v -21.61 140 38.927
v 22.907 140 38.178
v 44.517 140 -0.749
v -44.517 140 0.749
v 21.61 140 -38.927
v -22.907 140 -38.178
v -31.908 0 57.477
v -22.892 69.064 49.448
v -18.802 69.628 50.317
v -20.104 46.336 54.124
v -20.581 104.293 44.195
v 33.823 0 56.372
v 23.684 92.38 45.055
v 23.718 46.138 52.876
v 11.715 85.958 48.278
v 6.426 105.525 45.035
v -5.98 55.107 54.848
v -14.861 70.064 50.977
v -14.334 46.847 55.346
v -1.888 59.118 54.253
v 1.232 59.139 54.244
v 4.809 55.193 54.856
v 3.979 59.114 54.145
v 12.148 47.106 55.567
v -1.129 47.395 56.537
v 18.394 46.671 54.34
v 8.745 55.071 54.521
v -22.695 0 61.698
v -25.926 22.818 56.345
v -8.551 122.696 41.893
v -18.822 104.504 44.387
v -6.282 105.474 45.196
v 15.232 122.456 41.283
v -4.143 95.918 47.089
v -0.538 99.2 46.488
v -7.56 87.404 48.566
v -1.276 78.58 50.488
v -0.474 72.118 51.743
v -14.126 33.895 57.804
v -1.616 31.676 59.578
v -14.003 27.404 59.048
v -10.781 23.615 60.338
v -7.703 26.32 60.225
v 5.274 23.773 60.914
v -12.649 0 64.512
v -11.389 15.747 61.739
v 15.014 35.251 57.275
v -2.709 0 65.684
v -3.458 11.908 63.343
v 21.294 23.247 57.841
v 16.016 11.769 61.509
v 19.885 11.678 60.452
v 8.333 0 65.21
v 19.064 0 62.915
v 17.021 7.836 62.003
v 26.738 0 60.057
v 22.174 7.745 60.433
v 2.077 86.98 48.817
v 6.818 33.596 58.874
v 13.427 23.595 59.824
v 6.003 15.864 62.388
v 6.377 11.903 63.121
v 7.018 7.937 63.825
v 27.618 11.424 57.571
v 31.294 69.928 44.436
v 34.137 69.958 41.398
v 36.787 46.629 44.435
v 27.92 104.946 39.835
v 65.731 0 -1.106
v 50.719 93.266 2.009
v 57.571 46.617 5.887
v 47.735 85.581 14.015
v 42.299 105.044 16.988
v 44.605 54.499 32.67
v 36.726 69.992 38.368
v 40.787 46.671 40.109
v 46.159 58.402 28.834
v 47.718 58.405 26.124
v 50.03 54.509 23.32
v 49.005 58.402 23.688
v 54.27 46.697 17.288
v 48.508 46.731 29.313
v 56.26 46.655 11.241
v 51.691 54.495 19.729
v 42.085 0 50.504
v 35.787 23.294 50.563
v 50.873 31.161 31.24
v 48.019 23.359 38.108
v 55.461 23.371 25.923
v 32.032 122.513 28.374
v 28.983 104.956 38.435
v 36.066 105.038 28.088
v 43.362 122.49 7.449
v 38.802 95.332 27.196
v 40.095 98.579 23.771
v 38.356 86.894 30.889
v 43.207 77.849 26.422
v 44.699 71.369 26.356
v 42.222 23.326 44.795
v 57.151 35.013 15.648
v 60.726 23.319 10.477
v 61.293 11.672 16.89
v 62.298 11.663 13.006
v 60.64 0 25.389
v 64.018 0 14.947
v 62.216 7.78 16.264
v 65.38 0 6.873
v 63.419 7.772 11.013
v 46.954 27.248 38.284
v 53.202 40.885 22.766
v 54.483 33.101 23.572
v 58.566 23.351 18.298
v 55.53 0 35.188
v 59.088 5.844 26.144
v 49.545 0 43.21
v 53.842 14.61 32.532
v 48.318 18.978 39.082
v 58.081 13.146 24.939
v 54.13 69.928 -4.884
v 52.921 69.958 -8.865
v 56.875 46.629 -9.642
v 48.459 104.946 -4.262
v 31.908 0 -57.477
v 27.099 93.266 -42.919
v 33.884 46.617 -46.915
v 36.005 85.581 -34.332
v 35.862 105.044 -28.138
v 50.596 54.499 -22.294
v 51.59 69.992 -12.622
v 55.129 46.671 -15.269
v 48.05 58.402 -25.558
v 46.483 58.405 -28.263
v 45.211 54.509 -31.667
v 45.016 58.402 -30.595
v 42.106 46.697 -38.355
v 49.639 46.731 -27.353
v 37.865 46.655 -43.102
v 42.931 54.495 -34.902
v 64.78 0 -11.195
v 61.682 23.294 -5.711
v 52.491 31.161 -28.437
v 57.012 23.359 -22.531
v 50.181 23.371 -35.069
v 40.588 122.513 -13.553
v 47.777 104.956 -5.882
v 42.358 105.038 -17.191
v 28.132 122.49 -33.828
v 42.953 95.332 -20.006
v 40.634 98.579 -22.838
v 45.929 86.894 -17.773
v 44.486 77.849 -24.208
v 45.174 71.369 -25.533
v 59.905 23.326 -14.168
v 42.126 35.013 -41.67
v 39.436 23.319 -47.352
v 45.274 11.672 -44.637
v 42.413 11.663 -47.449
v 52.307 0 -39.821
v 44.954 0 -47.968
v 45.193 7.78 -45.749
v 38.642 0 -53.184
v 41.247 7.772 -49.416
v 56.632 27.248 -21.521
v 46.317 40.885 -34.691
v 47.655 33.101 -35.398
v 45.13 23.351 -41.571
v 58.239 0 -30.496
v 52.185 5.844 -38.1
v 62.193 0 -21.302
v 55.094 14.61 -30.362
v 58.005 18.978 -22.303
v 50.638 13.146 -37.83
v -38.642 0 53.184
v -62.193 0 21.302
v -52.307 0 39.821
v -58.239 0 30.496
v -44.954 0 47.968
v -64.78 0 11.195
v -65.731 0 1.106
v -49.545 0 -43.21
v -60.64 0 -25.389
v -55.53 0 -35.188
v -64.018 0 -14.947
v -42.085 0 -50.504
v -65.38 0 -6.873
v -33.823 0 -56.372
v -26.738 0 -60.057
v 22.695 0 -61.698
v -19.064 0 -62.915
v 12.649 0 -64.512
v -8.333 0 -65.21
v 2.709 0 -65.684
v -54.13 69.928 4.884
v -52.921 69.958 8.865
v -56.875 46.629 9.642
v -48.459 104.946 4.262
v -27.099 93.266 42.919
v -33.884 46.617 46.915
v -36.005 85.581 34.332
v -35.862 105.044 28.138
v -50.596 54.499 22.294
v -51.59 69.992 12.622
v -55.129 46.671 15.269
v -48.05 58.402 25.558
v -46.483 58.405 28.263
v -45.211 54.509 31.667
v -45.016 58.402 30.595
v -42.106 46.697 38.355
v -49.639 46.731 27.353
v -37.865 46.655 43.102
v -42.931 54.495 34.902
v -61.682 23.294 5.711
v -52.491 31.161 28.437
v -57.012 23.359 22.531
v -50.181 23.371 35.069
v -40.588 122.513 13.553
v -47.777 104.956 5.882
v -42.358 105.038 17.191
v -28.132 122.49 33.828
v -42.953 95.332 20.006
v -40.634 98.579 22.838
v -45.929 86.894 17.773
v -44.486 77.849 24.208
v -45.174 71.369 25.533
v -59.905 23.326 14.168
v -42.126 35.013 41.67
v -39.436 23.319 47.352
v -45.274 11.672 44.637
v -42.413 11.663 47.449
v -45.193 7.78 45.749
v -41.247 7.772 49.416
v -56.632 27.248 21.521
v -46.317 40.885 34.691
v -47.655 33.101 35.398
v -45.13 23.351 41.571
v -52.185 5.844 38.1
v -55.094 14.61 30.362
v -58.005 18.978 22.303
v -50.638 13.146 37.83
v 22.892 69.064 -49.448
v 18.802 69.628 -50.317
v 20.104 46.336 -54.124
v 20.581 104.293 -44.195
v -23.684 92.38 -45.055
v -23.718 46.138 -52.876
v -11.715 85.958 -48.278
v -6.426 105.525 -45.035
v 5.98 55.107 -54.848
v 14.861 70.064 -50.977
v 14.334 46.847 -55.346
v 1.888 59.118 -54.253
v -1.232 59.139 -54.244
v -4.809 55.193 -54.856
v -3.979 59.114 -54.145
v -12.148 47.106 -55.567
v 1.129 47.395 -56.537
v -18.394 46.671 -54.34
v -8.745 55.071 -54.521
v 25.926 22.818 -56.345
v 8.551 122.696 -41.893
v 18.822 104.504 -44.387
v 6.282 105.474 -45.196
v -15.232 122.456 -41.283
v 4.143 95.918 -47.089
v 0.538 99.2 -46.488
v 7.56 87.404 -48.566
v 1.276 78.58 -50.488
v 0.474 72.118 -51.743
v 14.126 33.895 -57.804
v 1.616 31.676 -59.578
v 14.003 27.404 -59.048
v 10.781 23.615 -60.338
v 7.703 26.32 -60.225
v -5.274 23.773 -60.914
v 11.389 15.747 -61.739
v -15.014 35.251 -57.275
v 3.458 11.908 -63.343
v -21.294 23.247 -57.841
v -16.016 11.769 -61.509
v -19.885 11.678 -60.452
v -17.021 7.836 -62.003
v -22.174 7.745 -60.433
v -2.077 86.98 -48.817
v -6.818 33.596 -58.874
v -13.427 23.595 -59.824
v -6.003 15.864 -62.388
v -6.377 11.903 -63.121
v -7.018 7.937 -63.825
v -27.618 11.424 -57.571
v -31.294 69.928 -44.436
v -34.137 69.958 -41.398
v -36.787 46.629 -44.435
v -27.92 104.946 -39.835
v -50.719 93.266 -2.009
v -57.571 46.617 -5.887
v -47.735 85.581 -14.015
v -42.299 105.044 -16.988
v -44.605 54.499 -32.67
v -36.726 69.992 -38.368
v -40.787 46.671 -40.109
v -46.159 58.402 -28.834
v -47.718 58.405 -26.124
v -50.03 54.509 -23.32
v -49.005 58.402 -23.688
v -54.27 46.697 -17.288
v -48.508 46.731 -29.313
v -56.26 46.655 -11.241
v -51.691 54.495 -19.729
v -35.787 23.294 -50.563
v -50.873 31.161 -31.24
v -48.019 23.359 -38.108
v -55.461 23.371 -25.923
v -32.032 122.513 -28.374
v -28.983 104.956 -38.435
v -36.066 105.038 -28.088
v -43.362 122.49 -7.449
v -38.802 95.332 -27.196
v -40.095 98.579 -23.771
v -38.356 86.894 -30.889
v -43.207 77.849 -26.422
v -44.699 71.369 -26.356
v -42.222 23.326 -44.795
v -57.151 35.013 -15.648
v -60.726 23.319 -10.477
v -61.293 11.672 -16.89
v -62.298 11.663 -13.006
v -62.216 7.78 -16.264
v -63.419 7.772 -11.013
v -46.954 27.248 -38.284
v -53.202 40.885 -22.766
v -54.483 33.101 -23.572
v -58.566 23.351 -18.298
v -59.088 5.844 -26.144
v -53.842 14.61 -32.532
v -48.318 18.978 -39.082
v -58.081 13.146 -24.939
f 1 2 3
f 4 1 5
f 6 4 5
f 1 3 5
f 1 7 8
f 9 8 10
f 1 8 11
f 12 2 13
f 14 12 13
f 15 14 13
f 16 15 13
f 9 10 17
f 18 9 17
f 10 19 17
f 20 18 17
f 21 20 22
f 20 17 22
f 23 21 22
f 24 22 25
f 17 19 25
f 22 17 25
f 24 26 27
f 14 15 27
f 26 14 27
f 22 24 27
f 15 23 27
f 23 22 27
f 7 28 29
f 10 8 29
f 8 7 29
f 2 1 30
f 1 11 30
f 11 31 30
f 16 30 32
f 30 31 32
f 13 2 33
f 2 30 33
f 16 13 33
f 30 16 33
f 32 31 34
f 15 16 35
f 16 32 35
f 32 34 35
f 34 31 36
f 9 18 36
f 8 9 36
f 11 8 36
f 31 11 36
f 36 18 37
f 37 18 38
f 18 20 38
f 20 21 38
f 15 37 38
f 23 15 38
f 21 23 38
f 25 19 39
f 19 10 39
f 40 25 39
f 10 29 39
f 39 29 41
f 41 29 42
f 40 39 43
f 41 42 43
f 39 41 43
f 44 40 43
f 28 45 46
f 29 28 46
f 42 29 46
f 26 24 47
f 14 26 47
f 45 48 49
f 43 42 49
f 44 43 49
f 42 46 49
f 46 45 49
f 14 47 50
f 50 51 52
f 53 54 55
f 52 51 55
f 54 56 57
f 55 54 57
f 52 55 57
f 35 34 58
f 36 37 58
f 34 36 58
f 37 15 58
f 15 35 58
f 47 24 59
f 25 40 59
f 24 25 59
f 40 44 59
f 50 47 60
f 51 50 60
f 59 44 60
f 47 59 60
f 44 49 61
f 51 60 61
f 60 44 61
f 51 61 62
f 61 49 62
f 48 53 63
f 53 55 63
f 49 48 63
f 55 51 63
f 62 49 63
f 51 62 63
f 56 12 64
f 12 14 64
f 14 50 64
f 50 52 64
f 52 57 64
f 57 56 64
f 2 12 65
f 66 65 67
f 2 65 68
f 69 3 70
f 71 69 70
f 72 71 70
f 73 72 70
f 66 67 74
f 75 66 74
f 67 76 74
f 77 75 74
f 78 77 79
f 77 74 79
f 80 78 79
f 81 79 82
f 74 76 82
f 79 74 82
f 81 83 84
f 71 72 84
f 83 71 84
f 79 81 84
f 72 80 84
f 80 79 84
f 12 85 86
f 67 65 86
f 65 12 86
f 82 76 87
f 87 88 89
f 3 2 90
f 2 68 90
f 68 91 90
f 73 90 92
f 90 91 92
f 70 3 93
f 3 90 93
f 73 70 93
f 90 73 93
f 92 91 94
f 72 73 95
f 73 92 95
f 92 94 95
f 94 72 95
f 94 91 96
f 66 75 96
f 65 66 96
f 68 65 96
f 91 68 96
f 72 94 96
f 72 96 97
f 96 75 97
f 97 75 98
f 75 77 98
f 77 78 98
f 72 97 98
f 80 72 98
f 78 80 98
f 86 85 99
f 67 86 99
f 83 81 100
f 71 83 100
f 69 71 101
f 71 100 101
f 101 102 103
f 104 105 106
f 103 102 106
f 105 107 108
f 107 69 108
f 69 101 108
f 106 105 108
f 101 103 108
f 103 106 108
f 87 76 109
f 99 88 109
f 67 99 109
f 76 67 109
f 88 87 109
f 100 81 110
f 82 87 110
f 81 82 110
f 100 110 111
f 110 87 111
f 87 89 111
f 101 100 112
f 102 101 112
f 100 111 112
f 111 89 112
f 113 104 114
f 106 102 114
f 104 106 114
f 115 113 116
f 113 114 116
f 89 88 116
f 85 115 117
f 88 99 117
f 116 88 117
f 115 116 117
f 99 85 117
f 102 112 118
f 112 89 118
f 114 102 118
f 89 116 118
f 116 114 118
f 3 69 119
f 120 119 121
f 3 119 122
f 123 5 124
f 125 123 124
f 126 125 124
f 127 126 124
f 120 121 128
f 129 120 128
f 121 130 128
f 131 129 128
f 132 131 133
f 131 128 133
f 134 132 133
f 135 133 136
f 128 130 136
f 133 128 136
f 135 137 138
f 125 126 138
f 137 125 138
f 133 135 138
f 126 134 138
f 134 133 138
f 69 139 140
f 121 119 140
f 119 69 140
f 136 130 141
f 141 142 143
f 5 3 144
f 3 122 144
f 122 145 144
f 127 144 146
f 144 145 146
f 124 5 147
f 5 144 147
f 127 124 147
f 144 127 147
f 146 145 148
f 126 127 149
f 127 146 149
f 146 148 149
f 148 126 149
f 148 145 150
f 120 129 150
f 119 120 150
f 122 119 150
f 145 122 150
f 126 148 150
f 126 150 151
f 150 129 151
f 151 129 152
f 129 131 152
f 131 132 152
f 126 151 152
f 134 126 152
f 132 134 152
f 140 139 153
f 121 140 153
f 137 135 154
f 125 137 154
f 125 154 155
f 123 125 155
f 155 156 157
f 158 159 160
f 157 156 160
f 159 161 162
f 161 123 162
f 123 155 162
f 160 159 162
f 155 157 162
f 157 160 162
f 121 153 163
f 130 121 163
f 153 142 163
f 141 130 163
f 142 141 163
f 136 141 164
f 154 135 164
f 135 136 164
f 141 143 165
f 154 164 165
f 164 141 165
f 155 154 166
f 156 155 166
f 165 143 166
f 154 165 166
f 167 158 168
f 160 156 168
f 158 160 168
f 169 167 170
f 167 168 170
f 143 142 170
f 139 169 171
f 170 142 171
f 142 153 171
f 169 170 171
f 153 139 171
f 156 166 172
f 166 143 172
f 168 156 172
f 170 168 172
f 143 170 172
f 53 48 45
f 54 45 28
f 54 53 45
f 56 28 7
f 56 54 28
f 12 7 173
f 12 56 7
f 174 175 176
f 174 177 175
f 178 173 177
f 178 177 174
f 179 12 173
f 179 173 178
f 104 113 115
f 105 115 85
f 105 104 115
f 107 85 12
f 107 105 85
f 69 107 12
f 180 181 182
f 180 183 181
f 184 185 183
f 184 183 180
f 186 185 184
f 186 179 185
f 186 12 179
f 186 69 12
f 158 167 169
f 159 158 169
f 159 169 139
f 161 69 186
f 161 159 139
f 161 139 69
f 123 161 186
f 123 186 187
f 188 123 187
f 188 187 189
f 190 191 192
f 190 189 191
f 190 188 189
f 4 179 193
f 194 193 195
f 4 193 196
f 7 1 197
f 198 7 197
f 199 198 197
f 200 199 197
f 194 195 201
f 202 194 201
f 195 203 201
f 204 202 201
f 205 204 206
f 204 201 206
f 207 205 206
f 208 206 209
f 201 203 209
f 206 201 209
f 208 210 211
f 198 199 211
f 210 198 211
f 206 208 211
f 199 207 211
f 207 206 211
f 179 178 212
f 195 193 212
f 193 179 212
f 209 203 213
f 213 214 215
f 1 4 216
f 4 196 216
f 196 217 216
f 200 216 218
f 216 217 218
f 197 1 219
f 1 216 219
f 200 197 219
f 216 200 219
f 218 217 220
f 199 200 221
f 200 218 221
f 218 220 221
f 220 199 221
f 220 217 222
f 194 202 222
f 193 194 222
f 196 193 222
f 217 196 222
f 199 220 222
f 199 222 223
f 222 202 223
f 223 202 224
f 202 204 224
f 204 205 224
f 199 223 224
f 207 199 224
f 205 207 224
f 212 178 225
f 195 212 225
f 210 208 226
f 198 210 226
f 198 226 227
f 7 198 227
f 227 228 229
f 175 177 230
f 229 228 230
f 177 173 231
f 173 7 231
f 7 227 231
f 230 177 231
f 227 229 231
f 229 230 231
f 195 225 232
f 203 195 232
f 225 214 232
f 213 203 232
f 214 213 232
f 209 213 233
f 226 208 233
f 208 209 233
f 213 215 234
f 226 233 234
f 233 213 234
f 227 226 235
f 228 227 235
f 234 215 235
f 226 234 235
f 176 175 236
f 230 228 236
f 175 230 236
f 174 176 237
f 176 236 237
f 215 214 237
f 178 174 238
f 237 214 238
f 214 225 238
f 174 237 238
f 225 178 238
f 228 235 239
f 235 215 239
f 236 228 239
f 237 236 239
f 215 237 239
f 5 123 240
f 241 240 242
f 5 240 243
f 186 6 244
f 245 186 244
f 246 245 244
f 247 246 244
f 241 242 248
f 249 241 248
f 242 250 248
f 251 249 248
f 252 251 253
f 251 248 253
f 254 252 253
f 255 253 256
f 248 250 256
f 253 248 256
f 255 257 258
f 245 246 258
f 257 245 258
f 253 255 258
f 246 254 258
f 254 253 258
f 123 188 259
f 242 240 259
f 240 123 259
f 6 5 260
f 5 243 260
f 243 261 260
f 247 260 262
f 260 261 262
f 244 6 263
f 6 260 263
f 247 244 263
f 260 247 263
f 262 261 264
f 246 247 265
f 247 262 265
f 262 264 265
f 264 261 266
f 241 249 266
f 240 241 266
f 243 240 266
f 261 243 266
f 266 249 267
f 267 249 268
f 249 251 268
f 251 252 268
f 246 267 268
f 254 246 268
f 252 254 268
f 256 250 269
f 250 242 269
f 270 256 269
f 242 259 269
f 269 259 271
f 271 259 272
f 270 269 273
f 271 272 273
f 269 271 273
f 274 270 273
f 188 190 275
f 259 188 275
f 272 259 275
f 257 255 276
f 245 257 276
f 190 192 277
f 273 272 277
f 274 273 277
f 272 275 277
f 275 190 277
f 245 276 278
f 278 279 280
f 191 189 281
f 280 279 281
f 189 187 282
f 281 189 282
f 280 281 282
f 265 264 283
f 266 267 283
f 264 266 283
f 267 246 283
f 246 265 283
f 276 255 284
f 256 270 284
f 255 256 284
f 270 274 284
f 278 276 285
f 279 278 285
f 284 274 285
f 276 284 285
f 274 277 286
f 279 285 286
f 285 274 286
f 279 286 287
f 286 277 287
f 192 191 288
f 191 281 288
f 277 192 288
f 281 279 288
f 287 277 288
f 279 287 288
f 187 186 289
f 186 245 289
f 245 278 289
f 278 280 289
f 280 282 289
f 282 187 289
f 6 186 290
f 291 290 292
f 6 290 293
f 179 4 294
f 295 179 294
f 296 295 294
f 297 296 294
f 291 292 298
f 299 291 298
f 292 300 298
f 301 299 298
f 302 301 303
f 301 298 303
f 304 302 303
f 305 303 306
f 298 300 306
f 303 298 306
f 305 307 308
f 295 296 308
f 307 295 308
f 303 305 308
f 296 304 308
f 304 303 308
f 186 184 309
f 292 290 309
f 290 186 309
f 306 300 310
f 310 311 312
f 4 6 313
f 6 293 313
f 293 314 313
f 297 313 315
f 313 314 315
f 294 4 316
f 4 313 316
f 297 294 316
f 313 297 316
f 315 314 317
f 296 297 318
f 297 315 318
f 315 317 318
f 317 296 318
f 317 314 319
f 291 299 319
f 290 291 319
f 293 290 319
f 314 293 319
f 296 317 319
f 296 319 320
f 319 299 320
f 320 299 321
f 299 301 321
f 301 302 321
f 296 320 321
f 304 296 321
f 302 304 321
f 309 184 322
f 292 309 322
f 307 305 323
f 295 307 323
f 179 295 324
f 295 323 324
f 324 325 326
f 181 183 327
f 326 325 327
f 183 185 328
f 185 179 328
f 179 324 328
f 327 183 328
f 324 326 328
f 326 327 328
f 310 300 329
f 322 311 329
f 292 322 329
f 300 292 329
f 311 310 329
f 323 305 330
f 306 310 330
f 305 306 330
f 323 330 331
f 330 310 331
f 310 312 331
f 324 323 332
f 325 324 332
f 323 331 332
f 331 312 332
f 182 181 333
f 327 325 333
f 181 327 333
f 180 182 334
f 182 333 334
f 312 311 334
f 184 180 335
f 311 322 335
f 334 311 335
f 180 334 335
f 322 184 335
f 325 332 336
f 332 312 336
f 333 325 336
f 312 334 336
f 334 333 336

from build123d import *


with BuildPart() as part:
    # Sketch2 → Loft2 section 0
    with BuildSketch(Plane(origin=(0, 140, 0), x_dir=(1, 0, 0), z_dir=(0, 1, 0))):
        Polygon((22.906863075, -38.178105125), (44.516640444, 0.748872781), (21.609777369, 38.926977906), (-22.906863075, 38.178105125), (-44.516640444, -0.748872781), (-21.609777369, -38.926977906), align=None)
    # Sketch1 for Loft2 → Loft2 section 1
    with BuildSketch(Plane(origin=(0, 0, 0), x_dir=(1, 0, 0), z_dir=(0, 1, 0))):
        with BuildLine():
            # circular arc as an exact rational Bezier (weights 1, cos(half-angle), 1)
            Bezier((33.823020911, -56.371701518), (66.369237958, -36.843971291), (65.730836025, 1.105744582), weights=[1, 0.866025404, 1])
            Bezier((65.730836025, 1.105744582), (65.092434092, 39.055460455), (31.907815114, 57.477446101), weights=[1, 0.866025404, 1])
            Bezier((31.907815114, 57.477446101), (-1.276803865, 75.899431746), (-33.823020911, 56.371701518), weights=[1, 0.866025404, 1])
            Bezier((-33.823020911, 56.371701518), (-66.369237958, 36.843971291), (-65.730836025, -1.105744582), weights=[1, 0.866025404, 1])
            Bezier((-65.730836025, -1.105744582), (-65.092434092, -39.055460455), (-31.907815114, -57.477446101), weights=[1, 0.866025404, 1])
            Bezier((-31.907815114, -57.477446101), (1.276803865, -75.899431746), (33.823020911, -56.371701518), weights=[1, 0.866025404, 1])
        make_face()
    loft()


solid = part.part
